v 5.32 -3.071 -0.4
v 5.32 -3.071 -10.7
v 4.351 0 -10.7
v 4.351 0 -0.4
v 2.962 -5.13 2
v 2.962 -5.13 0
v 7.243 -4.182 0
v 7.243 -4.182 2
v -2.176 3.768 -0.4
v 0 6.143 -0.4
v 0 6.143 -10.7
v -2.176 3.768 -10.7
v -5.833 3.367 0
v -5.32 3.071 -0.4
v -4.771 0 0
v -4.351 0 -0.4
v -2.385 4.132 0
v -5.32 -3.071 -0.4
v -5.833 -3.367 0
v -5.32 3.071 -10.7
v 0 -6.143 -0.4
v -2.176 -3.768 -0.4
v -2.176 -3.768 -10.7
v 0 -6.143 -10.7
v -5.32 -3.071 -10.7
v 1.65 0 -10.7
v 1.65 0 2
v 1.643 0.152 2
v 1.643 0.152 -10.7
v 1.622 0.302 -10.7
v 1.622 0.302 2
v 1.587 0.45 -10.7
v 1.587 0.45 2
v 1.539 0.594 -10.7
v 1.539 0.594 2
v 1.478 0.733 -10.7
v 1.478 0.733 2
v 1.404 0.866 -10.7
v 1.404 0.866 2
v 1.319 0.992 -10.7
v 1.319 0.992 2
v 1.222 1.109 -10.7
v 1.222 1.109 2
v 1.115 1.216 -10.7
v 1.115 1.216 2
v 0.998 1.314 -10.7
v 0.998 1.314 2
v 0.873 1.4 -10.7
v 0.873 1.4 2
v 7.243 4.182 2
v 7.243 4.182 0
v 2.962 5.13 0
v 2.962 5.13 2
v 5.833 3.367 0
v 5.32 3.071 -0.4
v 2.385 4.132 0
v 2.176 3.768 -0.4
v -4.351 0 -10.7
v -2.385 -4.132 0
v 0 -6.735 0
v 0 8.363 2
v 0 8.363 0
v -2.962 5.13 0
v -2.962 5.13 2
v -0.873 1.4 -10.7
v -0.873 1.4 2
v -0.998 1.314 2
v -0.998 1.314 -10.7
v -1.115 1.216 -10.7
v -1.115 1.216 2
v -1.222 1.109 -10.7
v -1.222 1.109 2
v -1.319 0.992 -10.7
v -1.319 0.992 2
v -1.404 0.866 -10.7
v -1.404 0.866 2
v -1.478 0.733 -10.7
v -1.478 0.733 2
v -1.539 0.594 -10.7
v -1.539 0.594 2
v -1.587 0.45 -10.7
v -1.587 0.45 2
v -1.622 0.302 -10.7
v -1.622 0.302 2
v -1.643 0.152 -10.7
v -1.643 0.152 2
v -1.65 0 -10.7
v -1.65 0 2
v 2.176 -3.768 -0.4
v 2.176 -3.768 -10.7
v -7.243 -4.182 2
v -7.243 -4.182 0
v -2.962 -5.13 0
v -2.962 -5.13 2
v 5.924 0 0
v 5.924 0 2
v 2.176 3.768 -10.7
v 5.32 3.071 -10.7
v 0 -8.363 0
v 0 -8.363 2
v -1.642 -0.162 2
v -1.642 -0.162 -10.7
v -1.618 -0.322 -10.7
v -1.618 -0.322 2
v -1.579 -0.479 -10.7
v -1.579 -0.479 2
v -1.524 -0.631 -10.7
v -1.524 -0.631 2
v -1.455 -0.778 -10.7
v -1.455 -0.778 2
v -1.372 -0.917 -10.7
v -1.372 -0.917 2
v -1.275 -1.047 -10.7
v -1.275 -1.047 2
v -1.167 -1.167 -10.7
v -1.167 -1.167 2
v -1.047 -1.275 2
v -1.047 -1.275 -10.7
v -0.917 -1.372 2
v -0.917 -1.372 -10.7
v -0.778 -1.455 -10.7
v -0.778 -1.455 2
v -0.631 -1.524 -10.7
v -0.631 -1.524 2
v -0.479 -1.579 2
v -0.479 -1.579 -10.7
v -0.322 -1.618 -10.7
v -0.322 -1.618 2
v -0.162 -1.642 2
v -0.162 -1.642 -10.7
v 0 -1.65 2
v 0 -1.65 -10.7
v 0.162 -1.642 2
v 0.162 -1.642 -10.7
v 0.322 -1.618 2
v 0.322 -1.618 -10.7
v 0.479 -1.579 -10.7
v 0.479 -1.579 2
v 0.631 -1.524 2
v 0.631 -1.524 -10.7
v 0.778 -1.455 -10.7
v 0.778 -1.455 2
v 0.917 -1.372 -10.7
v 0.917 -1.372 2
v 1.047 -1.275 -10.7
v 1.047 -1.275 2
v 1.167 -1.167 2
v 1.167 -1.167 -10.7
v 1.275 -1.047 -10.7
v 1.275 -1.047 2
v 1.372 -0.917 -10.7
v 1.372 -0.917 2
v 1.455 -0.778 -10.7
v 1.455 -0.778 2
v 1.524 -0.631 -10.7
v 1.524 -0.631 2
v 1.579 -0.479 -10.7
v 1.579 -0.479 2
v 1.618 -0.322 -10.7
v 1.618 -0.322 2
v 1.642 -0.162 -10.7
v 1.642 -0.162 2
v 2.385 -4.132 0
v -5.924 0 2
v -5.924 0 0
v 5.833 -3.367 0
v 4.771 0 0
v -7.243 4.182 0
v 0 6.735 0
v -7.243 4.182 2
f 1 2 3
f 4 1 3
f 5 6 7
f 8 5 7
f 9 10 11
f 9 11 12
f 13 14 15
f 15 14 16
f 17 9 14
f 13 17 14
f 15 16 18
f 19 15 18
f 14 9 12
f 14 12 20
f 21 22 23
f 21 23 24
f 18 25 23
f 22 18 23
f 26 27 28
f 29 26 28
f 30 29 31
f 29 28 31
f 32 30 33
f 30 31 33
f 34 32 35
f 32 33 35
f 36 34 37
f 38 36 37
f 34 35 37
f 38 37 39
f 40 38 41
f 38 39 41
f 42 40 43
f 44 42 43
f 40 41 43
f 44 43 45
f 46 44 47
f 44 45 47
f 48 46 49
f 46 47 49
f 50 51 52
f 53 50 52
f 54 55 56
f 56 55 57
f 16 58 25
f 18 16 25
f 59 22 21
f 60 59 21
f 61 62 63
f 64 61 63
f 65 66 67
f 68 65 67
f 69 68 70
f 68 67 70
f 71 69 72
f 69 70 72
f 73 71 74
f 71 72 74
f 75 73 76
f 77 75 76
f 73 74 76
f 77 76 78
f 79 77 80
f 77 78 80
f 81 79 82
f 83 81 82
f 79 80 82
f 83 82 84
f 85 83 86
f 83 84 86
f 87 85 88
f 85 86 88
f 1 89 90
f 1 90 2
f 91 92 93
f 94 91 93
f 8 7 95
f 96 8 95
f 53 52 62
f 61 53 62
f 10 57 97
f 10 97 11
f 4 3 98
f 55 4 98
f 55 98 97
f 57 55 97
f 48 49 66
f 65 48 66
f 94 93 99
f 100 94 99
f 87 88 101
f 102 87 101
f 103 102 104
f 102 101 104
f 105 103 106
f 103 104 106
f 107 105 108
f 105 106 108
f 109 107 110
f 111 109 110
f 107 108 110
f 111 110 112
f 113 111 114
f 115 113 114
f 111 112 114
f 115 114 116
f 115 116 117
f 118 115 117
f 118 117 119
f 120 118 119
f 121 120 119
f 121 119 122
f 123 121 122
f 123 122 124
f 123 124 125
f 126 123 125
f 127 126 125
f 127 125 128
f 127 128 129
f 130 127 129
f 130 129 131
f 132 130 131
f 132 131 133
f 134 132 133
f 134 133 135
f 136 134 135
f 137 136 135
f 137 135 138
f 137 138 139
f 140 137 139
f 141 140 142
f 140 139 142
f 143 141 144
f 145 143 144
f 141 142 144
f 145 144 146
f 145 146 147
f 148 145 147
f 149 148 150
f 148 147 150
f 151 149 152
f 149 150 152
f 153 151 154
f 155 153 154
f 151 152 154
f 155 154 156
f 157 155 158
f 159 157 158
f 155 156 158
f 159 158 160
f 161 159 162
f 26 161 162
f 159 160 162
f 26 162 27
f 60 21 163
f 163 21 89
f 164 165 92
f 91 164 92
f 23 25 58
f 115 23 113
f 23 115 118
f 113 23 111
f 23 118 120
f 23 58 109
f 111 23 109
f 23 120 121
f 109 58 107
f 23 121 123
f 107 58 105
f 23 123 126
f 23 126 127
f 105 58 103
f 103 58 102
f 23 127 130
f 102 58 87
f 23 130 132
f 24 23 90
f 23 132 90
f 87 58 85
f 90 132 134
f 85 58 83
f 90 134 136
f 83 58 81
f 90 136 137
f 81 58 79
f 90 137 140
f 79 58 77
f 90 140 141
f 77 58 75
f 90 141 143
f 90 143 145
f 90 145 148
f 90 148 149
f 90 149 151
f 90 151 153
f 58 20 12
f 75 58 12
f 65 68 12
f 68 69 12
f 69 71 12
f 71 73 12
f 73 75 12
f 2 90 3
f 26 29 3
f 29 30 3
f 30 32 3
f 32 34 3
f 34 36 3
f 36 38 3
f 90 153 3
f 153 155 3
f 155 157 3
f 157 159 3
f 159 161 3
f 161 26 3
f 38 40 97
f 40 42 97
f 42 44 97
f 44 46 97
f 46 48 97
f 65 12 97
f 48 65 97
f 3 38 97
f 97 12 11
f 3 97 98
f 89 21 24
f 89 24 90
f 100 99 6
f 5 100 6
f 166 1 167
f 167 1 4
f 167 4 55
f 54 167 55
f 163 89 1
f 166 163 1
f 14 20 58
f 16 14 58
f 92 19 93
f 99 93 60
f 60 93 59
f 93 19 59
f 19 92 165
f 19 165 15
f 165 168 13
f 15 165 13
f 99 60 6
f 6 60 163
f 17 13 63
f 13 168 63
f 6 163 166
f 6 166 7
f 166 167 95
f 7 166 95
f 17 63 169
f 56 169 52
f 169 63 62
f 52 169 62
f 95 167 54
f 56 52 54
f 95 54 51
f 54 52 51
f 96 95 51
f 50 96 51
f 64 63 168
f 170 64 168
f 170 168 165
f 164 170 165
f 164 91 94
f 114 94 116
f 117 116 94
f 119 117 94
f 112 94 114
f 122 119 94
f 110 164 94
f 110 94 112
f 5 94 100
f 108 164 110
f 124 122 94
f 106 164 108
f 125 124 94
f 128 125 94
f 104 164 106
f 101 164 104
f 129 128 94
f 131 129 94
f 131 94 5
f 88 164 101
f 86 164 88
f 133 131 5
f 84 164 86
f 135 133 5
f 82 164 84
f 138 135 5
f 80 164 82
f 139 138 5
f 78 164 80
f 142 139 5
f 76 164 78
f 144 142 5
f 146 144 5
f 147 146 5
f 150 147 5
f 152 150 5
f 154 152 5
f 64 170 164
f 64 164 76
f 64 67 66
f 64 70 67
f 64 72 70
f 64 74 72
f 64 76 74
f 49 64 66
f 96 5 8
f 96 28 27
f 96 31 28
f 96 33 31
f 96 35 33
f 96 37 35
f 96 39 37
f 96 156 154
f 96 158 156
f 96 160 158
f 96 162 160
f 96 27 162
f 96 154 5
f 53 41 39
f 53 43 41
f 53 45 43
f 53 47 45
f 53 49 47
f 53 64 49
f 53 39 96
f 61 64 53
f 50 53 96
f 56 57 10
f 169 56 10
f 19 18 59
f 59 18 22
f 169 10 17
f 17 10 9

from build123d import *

# Parameters (mm, degrees)
BOSS_EXTRUDE1_DEPTH = 10.7
BOSS_EXTRUDE2_DEPTH = 2
CUT_EXTRUDE2_DEPTH  = 17.842989329
CHAMFER1_SIZE       = 0.4


with BuildPart() as part:
    # Sketch1 → Boss-Extrude1 (new body)
    with BuildSketch(Plane.XY):
        Polygon((2.175697935, 3.768419365), (0, 6.142777017), (-2.175697935, 3.768419365), (-5.319800946, 3.071388508), (-4.351395869, 0), (-5.319800946, -3.071388508), (-2.175697935, -3.768419365), (0, -6.142777017), (2.175697935, -3.768419365), (5.319800946, -3.071388508), (4.351395869, 0), (5.319800946, 3.071388508), align=None)
    extrude(amount=-BOSS_EXTRUDE1_DEPTH)

    # Sketch2 → Boss-Extrude2 (add)
    with BuildSketch(Plane.XY):
        Polygon((7.242620565, 4.181528933), (2.962094779, 5.130498653), (0, 8.363057866), (-2.962094779, 5.130498653), (-7.242620565, 4.181528933), (-5.924189557, 0), (-7.242620565, -4.181528933), (-2.962094779, -5.130498653), (0, -8.363057866), (2.962094779, -5.130498653), (7.242620565, -4.181528933), (5.924189557, 0), align=None)
    extrude(amount=BOSS_EXTRUDE2_DEPTH)

    # Sketch3 → Cut-Extrude2 (cut, through all)
    with BuildSketch(Plane.XY.offset(2)):
        with BuildLine():
            ThreePointArc((1.65, 0), (1.442792528, 0.800530899), (0.87321246, 1.4))
            Line((0.87321246, 1.4), (-0.87321246, 1.4))
            ThreePointArc((-0.87321246, 1.4), (-1.442792528, 0.800530899), (-1.65, 0))
            ThreePointArc((-1.65, 0), (0, -1.65), (1.65, 0))
        make_face()
    extrude(amount=-CUT_EXTRUDE2_DEPTH, mode=Mode.SUBTRACT)

    # Chamfer1
    chamfer1_edges = [part.edges().sort_by_distance(p)[0] for p in [
        (3.74774944, -3.419903937, 0),
        (1.087848967, -4.955598191, 0),
        (-1.087848967, -4.955598191, 0),
        (-3.74774944, -3.419903937, 0),
        (-4.835598408, -1.535694254, 0),
        (-4.835598408, 1.535694254, 0),
        (-3.74774944, 3.419903937, 0),
        (4.835598408, -1.535694254, 0),
        (4.835598408, 1.535694254, 0),
        (3.74774944, 3.419903937, 0),
        (1.087848967, 4.955598191, 0),
        (-1.087848967, 4.955598191, 0),
    ]]
    chamfer(chamfer1_edges, length=CHAMFER1_SIZE)


solid = part.part
